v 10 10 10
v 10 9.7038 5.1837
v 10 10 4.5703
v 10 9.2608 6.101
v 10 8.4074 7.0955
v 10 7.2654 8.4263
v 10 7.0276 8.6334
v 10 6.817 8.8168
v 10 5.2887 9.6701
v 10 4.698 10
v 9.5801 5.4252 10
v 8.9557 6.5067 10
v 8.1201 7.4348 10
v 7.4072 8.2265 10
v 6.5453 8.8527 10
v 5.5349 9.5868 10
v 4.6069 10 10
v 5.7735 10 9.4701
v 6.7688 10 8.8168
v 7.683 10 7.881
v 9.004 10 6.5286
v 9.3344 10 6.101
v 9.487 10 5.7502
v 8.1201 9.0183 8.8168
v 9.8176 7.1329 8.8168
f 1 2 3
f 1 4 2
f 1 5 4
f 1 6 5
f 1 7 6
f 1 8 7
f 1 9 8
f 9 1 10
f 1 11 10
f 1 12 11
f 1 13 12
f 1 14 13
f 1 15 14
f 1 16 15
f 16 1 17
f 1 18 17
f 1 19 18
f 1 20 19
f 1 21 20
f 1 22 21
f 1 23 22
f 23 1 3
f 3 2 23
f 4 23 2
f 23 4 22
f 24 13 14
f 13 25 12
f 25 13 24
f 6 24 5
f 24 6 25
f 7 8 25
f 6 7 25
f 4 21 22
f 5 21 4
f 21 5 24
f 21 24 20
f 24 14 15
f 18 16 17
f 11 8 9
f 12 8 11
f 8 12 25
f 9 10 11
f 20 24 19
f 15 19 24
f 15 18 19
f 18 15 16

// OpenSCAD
// Generated by SolidPython 0.4.6 on 2020-01-16 21:43:11


difference() {
	cube(size = 10);
	sphere(r = 15);
}
/***********************************************
*********      SolidPython code:      **********
************************************************
 
# This is a testing file for Solid Python
# Use this file to learn the ropes of Solid Python

from solid import *
from solid.utils import *  # Not required, but the utils module is useful

d = difference()(
    cube(10),  # Note the comma between each element!
    sphere(15)
)

scad_render_to_file(d, 'Test.scad')
 
 
************************************************/
